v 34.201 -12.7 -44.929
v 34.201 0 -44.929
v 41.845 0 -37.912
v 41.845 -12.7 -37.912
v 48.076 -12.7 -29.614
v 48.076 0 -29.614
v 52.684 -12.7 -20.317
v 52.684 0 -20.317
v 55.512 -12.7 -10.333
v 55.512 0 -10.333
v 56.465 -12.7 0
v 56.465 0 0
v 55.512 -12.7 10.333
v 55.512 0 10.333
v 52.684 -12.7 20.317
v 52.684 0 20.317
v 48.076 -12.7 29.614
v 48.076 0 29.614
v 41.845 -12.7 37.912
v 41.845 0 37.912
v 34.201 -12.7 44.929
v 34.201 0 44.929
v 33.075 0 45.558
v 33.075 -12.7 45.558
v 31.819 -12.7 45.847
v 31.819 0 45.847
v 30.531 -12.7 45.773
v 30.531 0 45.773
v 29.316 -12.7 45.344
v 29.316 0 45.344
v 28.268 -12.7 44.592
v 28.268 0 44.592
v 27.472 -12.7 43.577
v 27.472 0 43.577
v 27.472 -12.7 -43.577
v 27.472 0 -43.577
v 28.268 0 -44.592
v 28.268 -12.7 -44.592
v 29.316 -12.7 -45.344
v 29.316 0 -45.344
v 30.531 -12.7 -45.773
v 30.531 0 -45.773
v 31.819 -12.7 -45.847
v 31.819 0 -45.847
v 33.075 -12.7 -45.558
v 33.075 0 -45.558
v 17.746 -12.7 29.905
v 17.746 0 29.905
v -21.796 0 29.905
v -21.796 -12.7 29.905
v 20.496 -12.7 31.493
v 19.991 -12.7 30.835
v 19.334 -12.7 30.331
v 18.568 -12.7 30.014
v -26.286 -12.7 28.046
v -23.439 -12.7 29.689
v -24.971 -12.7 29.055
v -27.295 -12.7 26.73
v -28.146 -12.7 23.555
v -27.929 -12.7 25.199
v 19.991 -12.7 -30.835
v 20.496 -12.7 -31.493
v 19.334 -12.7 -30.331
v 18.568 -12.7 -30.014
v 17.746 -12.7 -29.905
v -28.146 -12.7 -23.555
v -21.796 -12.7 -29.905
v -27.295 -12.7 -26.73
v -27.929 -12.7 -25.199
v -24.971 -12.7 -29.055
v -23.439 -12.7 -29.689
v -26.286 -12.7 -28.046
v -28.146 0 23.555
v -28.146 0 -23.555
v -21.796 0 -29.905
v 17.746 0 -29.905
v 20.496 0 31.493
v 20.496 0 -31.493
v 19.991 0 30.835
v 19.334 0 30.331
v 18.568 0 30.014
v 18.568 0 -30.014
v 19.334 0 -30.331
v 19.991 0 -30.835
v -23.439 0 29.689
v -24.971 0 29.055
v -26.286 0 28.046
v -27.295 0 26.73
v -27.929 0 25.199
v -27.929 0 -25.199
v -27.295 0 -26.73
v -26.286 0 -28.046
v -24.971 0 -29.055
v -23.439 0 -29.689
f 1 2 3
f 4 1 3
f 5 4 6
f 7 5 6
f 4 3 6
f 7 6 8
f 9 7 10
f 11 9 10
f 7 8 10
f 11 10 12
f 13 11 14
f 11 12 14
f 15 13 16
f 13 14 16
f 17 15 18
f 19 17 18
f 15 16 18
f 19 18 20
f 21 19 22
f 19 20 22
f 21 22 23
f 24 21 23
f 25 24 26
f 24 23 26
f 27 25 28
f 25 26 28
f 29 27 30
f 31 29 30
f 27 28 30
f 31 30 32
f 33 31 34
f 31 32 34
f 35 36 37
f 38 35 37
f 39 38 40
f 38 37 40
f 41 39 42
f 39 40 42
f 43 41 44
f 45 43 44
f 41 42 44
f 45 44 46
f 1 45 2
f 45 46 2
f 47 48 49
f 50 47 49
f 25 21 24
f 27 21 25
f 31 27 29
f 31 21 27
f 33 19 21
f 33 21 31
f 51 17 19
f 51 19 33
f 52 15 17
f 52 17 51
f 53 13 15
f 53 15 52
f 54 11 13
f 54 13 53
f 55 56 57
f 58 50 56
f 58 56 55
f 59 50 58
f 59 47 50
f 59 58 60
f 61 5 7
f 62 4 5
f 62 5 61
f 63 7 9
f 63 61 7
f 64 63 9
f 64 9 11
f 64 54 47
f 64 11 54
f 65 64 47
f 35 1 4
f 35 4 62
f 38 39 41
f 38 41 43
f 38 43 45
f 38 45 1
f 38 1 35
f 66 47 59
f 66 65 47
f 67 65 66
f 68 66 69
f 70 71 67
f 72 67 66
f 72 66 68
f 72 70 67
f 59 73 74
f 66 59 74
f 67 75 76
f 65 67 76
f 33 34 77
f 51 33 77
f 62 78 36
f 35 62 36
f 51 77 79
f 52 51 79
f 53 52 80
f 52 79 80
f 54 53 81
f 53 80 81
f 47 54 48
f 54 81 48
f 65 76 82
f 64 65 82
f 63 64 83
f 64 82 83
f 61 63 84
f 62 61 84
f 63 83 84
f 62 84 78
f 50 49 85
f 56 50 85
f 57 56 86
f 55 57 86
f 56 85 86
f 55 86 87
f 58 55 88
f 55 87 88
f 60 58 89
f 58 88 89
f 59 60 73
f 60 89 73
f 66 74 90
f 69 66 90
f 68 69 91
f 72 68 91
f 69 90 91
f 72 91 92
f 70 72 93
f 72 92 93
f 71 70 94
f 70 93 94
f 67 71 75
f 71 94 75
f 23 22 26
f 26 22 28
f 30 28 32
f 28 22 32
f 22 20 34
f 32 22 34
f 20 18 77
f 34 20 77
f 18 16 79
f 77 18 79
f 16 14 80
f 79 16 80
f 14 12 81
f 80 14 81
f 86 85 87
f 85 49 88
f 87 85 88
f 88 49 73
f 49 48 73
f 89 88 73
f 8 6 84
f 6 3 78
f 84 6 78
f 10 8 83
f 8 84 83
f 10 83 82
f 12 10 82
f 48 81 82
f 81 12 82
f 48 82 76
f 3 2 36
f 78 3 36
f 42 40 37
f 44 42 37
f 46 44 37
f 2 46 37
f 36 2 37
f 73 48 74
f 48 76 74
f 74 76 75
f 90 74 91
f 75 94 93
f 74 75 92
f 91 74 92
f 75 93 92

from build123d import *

# Parameters (mm, degrees)
EXTRUDE4_DEPTH = 12.7


with BuildPart() as part:
    # Sketch9 → Extrude4 (new body)
    with BuildSketch(Plane(origin=(0, 0, 0), x_dir=(1, 0, 0), z_dir=(0, 1, 0))):
        with BuildLine():
            Line((20.495684684, 31.492994432), (27.472430394, 43.577072472))
            ThreePointArc((27.472430394, 43.577072472), (30.531314315, 45.773497268), (34.201168909, 44.928973738))
            ThreePointArc((34.201168909, 44.928973738), (56.465322419, 0), (34.201168909, -44.928973738))
            ThreePointArc((34.201168909, -44.928973738), (30.531314315, -45.773497268), (27.472430394, -43.577072472))
            Line((27.472430394, -43.577072472), (20.495684684, -31.492994432))
            ThreePointArc((20.495684684, -31.492994432), (19.333554027, -30.330863775), (17.746054027, -29.905494432))
            Line((17.746054027, -29.905494432), (-21.795601412, -29.905494432))
            ThreePointArc((-21.795601412, -29.905494432), (-26.285729472, -28.045622492), (-28.145601412, -23.555494432))
            Line((-28.145601412, -23.555494432), (-28.145601412, 23.555494432))
            ThreePointArc((-28.145601412, 23.555494432), (-26.285729472, 28.045622492), (-21.795601412, 29.905494432))
            Line((-21.795601412, 29.905494432), (17.746054027, 29.905494432))
            ThreePointArc((17.746054027, 29.905494432), (19.333554027, 30.330863775), (20.495684684, 31.492994432))
        make_face()
    extrude(amount=-EXTRUDE4_DEPTH)


solid = part.part
